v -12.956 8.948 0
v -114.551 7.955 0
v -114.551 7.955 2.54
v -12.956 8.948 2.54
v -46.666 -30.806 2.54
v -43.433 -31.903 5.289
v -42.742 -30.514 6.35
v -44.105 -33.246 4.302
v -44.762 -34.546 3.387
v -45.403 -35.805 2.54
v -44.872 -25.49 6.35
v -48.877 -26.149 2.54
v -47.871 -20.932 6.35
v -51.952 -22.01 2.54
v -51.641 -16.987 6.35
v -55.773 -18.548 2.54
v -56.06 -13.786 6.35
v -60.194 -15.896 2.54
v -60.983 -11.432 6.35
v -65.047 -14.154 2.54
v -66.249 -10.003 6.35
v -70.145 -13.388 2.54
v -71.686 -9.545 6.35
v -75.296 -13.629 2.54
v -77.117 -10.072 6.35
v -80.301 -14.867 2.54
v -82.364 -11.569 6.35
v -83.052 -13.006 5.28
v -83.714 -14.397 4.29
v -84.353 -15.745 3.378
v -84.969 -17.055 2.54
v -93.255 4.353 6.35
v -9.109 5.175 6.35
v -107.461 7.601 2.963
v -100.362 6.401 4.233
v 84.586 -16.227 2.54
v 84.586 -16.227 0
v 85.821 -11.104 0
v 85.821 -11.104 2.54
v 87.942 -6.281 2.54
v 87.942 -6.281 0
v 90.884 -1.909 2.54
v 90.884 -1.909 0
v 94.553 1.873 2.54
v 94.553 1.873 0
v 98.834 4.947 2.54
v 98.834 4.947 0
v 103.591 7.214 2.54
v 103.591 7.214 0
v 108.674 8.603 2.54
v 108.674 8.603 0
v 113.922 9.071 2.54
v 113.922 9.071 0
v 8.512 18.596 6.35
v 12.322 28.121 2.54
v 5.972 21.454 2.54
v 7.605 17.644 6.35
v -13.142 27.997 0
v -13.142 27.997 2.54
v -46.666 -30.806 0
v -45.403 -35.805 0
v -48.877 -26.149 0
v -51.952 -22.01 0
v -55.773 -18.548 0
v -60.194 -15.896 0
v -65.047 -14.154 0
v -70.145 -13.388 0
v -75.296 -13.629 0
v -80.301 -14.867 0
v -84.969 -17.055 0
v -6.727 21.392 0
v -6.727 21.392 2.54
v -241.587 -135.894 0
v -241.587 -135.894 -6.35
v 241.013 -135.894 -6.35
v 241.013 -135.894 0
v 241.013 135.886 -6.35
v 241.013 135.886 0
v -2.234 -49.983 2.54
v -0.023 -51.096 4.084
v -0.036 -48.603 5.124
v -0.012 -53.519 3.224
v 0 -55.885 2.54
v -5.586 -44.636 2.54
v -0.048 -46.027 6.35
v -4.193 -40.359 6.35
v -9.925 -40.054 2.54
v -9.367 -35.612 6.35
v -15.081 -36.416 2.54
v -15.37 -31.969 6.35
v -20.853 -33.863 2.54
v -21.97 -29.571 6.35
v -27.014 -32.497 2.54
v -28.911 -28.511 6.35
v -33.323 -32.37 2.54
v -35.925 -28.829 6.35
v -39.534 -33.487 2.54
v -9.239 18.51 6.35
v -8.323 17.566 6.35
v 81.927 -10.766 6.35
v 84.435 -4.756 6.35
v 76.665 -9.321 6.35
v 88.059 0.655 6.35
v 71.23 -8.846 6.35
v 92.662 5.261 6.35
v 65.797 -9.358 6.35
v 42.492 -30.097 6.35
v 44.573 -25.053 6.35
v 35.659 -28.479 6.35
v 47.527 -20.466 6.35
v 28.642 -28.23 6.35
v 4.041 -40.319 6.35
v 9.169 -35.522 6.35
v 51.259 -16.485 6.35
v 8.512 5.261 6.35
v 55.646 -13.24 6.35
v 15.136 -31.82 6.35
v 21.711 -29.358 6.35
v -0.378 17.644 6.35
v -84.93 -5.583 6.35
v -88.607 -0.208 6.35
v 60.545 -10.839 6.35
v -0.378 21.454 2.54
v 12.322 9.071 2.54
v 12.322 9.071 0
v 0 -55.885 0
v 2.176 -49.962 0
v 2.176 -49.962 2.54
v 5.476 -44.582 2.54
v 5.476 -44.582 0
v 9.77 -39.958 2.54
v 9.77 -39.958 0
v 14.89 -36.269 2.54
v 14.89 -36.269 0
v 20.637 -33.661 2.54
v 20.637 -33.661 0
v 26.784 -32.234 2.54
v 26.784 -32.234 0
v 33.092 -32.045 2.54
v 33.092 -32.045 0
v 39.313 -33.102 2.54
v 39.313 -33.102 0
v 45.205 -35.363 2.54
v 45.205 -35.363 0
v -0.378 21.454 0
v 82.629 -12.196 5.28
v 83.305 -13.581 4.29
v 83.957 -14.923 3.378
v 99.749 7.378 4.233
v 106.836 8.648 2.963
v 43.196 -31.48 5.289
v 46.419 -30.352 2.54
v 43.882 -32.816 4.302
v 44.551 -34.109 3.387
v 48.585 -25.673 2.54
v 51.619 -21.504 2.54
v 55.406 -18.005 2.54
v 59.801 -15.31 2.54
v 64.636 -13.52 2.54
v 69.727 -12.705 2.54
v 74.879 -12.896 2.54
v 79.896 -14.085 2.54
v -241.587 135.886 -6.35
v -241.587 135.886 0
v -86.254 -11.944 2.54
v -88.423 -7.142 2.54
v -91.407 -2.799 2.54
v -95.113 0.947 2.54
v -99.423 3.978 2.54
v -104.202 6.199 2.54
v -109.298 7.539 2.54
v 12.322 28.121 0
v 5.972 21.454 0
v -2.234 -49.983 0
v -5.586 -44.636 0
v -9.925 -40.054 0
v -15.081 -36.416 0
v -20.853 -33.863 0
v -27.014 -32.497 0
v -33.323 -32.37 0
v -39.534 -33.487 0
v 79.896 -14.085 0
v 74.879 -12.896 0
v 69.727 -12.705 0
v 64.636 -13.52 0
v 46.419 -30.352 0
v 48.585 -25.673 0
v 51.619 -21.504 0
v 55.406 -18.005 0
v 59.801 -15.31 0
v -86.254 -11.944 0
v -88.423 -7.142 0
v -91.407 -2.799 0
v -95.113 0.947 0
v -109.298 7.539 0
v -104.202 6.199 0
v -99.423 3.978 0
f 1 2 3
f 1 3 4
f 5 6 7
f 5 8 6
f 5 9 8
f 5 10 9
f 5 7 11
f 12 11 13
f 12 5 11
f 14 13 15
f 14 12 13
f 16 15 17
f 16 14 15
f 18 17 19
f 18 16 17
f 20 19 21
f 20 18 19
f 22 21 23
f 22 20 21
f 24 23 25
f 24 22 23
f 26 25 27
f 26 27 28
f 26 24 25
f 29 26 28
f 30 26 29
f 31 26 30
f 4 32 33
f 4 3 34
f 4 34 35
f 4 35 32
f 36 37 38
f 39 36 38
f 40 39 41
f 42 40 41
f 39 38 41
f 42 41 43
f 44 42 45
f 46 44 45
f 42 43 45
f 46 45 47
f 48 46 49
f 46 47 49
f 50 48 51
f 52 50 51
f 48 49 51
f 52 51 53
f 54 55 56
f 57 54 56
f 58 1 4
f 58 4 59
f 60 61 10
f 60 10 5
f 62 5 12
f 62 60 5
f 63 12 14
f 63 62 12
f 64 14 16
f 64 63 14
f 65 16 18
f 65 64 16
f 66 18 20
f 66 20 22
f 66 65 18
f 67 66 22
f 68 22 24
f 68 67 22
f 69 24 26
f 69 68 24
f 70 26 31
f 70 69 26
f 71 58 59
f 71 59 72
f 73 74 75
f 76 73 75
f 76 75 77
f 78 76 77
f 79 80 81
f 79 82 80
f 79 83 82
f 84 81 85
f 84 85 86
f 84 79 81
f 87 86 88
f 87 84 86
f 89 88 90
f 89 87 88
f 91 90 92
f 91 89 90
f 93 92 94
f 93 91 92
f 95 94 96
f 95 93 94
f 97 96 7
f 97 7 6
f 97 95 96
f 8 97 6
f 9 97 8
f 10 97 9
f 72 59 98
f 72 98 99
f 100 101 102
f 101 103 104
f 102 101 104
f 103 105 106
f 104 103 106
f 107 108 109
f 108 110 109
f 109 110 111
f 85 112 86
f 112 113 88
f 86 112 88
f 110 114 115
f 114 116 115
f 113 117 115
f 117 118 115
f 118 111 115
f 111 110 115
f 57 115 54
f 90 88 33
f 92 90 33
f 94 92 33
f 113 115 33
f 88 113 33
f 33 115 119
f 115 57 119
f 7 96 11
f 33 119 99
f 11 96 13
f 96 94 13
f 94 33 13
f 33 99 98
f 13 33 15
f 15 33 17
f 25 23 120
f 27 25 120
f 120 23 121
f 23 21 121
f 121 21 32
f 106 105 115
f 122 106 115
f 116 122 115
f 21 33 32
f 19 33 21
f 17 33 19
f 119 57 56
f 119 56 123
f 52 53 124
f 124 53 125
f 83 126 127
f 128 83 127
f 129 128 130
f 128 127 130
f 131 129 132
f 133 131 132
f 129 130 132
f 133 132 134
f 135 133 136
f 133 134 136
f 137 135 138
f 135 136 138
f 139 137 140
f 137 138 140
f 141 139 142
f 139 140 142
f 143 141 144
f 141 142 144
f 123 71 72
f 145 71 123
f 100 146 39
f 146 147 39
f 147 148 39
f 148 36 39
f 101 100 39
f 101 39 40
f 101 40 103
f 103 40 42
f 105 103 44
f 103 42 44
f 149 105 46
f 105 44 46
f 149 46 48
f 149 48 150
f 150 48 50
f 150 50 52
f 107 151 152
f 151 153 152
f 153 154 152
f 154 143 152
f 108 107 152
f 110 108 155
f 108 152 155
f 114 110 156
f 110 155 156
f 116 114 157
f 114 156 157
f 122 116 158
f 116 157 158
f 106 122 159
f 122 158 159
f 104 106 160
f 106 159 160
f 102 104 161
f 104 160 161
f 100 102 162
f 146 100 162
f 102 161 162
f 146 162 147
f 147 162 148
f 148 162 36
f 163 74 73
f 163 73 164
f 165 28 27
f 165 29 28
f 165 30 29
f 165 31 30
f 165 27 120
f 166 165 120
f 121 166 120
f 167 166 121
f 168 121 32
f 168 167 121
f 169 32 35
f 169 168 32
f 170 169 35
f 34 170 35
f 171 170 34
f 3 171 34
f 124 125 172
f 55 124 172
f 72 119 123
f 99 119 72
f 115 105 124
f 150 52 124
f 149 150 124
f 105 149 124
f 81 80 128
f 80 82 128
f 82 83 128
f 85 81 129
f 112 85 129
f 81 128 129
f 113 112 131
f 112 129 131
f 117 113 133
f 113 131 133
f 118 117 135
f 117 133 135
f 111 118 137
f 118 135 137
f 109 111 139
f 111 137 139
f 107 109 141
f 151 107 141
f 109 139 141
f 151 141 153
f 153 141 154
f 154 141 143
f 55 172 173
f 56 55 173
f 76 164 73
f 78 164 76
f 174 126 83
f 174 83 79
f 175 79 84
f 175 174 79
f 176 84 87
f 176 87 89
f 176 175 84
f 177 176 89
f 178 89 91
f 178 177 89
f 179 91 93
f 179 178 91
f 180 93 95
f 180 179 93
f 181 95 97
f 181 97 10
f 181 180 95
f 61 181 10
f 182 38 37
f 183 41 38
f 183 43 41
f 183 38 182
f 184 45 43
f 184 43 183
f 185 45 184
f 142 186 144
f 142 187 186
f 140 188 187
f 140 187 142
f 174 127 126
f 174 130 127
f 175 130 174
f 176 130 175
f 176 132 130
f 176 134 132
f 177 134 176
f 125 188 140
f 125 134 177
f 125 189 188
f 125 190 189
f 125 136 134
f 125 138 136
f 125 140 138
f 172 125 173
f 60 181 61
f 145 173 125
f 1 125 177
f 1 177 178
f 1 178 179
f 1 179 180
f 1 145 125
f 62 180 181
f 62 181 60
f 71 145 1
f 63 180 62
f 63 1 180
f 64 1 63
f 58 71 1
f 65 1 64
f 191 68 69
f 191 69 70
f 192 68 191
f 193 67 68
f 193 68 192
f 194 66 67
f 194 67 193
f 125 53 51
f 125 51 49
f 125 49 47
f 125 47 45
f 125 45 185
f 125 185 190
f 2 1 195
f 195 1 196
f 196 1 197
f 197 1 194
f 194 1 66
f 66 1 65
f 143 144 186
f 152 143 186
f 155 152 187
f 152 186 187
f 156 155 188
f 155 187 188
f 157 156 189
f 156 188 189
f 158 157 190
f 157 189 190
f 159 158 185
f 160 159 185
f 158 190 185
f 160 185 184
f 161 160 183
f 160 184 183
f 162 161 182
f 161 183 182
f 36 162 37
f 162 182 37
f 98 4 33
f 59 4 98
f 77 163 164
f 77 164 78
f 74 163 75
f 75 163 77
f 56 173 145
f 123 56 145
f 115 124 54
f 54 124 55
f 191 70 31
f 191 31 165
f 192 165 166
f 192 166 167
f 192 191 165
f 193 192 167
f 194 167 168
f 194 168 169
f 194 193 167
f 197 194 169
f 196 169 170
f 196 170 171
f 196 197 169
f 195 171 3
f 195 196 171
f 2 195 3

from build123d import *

# Parameters (mm, degrees)
F1_DEPTH = 6.35
F3_SIZE  = 3.81
F5_W     = 482.6
F5_H     = 271.78
F6_DEPTH = 6.35


with BuildPart() as f1:
    # F0 (on Top) → F1 (new body)
    with BuildSketch(Plane.XY):
        with BuildLine():
            Line((5.972245817, 21.453949254), (-0.377754183, 21.453949254))
            Line((-0.377754183, 21.453949254), (0, -55.885091424))
            ThreePointArc((0, -55.885091424), (17.6988021237, -34.8224985897), (45.2049598098, -35.3625938296))
            ThreePointArc((45.2049598098, -35.3625938296), (59.8006112137, -15.3096178799), (84.5859646797, -16.2267535925))
            ThreePointArc((84.5859646797, -16.2267535925), (94.5533505133, 1.8734329543), (113.922245817, 9.071448521))
            Line((113.922245817, 9.071448521), (12.322245817, 9.071448521))
            Line((12.322245817, 9.071448521), (12.322245817, 28.121448521))
            Line((12.322245817, 28.121448521), (5.972245817, 21.453949254))
        make_face()
    extrude(amount=F1_DEPTH)

    # F2: F1 across face


with BuildPart() as f1_1:
    add(f1.part)
    add(f1.part.mirror(Plane(origin=(-0.1888770915, -17.215571085, 3.175), x_dir=(0.0048843336, -0.9999880716, 0), z_dir=(-0.9999880716, -0.0048843336, 0))))

    # F3
    f3_edges = [f1_1.edges().sort_by_distance(p)[0] for p in [
        (12.322246, 18.596449, 6.35),
        (9.147246, 24.787699, 6.35),
        (2.797246, 21.453949, 6.35),
        (-3.552603, 21.422934, 6.35),
        (-9.934866, 24.694494, 6.35),
        (-13.049235, 18.472524, 6.35),
        (-63.753765, 8.451736, 6.35),
        (-95.113056, 0.947028, 6.35),
        (-60.194121, -15.895719, 6.35),
        (-17.903709, -34.996395, 6.35),
        (17.698802, -34.822499, 6.35),
        (59.800611, -15.309618, 6.35),
        (94.553351, 1.873433, 6.35),
        (63.122246, 9.071449, 6.35),
    ]]
    chamfer(f3_edges, length=F3_SIZE)


with BuildPart() as f6:
    # F5 (on offset) → F6 (new body)
    with BuildSketch(Plane.XY.offset(-6.35)):
        with Locations((-0.2867917727, -0.003516674)):
            Rectangle(F5_W, F5_H)
    extrude(amount=F6_DEPTH)


solid = Compound([f1_1.part, f6.part])
